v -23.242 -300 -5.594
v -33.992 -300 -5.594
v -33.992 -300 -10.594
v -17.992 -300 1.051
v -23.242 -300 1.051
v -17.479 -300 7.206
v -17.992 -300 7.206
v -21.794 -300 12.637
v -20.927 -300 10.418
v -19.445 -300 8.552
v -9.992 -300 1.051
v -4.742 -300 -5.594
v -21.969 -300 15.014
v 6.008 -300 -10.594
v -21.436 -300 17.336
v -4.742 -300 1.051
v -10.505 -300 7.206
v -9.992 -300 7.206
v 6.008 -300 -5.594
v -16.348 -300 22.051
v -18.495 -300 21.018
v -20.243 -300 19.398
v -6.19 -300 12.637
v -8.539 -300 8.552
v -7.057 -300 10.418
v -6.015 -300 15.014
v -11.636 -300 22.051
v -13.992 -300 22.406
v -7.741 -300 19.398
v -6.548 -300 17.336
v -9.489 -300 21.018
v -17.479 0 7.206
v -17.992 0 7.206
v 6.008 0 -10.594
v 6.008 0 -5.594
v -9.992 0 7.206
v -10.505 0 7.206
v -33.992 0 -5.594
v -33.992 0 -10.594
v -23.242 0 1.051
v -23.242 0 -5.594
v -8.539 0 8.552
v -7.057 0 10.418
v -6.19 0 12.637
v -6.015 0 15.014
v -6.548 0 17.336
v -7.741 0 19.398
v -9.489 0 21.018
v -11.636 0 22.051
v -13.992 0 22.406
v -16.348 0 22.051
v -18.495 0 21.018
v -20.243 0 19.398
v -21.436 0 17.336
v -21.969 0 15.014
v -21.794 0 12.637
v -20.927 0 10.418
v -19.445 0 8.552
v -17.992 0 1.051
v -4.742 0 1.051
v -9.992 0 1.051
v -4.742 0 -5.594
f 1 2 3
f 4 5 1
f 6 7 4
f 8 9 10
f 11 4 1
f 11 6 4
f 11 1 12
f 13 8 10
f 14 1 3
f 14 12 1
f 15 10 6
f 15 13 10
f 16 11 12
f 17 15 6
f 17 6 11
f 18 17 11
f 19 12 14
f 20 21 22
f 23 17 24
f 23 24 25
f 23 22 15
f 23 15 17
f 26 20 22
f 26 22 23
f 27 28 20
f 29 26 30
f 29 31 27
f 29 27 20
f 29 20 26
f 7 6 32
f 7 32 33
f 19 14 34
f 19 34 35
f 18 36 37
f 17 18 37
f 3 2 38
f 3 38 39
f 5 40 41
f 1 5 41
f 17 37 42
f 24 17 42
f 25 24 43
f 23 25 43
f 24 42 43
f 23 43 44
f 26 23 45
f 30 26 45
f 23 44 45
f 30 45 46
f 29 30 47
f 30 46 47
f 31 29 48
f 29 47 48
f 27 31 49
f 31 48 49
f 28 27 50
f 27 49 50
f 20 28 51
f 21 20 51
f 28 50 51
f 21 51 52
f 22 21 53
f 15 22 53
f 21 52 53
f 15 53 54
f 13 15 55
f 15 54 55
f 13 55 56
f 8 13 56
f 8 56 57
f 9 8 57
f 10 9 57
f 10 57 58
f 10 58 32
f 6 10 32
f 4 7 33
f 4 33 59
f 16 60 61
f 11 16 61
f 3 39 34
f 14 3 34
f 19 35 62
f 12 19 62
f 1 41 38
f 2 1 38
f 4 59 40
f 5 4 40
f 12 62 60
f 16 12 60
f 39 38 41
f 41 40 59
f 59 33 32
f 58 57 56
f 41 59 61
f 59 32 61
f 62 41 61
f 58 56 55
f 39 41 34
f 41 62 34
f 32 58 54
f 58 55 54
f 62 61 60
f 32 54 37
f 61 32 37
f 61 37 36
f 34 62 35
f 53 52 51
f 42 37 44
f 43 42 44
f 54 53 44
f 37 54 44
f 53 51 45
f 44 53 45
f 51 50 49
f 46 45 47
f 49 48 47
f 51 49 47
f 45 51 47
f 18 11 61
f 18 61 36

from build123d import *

# Parameters (mm, degrees)
F1_DEPTH = 300


with BuildPart() as f1:
    # F0 (on Front) → F1 (new body)
    with BuildSketch(Plane.XZ):
        with BuildLine():
            Line((-33.991796, -5.594154), (-33.991796, -10.594154))
            Line((-33.991796, -10.594154), (6.008204, -10.594154))
            Line((6.008204, -10.594154), (6.008204, -5.594154))
            Line((6.008204, -5.594154), (-4.741796, -5.594154))
            Line((-4.741796, -5.594154), (-4.741796, 1.051143))
            Line((-4.741796, 1.051143), (-9.991796, 1.051143))
            Line((-9.991796, 1.051143), (-9.991796, 7.205846))
            Line((-9.991796, 7.205846), (-10.504677, 7.205846))
            ThreePointArc((-10.504677, 7.205846), (-13.991796, 22.405846), (-17.478915, 7.205846))
            Line((-17.478915, 7.205846), (-17.991796, 7.205846))
            Line((-17.991796, 7.205846), (-17.991796, 1.051143))
            Line((-17.991796, 1.051143), (-23.241796, 1.051143))
            Line((-23.241796, 1.051143), (-23.241796, -5.594154))
            Line((-23.241796, -5.594154), (-33.991796, -5.594154))
        make_face()
    extrude(amount=F1_DEPTH)


solid = f1.part
